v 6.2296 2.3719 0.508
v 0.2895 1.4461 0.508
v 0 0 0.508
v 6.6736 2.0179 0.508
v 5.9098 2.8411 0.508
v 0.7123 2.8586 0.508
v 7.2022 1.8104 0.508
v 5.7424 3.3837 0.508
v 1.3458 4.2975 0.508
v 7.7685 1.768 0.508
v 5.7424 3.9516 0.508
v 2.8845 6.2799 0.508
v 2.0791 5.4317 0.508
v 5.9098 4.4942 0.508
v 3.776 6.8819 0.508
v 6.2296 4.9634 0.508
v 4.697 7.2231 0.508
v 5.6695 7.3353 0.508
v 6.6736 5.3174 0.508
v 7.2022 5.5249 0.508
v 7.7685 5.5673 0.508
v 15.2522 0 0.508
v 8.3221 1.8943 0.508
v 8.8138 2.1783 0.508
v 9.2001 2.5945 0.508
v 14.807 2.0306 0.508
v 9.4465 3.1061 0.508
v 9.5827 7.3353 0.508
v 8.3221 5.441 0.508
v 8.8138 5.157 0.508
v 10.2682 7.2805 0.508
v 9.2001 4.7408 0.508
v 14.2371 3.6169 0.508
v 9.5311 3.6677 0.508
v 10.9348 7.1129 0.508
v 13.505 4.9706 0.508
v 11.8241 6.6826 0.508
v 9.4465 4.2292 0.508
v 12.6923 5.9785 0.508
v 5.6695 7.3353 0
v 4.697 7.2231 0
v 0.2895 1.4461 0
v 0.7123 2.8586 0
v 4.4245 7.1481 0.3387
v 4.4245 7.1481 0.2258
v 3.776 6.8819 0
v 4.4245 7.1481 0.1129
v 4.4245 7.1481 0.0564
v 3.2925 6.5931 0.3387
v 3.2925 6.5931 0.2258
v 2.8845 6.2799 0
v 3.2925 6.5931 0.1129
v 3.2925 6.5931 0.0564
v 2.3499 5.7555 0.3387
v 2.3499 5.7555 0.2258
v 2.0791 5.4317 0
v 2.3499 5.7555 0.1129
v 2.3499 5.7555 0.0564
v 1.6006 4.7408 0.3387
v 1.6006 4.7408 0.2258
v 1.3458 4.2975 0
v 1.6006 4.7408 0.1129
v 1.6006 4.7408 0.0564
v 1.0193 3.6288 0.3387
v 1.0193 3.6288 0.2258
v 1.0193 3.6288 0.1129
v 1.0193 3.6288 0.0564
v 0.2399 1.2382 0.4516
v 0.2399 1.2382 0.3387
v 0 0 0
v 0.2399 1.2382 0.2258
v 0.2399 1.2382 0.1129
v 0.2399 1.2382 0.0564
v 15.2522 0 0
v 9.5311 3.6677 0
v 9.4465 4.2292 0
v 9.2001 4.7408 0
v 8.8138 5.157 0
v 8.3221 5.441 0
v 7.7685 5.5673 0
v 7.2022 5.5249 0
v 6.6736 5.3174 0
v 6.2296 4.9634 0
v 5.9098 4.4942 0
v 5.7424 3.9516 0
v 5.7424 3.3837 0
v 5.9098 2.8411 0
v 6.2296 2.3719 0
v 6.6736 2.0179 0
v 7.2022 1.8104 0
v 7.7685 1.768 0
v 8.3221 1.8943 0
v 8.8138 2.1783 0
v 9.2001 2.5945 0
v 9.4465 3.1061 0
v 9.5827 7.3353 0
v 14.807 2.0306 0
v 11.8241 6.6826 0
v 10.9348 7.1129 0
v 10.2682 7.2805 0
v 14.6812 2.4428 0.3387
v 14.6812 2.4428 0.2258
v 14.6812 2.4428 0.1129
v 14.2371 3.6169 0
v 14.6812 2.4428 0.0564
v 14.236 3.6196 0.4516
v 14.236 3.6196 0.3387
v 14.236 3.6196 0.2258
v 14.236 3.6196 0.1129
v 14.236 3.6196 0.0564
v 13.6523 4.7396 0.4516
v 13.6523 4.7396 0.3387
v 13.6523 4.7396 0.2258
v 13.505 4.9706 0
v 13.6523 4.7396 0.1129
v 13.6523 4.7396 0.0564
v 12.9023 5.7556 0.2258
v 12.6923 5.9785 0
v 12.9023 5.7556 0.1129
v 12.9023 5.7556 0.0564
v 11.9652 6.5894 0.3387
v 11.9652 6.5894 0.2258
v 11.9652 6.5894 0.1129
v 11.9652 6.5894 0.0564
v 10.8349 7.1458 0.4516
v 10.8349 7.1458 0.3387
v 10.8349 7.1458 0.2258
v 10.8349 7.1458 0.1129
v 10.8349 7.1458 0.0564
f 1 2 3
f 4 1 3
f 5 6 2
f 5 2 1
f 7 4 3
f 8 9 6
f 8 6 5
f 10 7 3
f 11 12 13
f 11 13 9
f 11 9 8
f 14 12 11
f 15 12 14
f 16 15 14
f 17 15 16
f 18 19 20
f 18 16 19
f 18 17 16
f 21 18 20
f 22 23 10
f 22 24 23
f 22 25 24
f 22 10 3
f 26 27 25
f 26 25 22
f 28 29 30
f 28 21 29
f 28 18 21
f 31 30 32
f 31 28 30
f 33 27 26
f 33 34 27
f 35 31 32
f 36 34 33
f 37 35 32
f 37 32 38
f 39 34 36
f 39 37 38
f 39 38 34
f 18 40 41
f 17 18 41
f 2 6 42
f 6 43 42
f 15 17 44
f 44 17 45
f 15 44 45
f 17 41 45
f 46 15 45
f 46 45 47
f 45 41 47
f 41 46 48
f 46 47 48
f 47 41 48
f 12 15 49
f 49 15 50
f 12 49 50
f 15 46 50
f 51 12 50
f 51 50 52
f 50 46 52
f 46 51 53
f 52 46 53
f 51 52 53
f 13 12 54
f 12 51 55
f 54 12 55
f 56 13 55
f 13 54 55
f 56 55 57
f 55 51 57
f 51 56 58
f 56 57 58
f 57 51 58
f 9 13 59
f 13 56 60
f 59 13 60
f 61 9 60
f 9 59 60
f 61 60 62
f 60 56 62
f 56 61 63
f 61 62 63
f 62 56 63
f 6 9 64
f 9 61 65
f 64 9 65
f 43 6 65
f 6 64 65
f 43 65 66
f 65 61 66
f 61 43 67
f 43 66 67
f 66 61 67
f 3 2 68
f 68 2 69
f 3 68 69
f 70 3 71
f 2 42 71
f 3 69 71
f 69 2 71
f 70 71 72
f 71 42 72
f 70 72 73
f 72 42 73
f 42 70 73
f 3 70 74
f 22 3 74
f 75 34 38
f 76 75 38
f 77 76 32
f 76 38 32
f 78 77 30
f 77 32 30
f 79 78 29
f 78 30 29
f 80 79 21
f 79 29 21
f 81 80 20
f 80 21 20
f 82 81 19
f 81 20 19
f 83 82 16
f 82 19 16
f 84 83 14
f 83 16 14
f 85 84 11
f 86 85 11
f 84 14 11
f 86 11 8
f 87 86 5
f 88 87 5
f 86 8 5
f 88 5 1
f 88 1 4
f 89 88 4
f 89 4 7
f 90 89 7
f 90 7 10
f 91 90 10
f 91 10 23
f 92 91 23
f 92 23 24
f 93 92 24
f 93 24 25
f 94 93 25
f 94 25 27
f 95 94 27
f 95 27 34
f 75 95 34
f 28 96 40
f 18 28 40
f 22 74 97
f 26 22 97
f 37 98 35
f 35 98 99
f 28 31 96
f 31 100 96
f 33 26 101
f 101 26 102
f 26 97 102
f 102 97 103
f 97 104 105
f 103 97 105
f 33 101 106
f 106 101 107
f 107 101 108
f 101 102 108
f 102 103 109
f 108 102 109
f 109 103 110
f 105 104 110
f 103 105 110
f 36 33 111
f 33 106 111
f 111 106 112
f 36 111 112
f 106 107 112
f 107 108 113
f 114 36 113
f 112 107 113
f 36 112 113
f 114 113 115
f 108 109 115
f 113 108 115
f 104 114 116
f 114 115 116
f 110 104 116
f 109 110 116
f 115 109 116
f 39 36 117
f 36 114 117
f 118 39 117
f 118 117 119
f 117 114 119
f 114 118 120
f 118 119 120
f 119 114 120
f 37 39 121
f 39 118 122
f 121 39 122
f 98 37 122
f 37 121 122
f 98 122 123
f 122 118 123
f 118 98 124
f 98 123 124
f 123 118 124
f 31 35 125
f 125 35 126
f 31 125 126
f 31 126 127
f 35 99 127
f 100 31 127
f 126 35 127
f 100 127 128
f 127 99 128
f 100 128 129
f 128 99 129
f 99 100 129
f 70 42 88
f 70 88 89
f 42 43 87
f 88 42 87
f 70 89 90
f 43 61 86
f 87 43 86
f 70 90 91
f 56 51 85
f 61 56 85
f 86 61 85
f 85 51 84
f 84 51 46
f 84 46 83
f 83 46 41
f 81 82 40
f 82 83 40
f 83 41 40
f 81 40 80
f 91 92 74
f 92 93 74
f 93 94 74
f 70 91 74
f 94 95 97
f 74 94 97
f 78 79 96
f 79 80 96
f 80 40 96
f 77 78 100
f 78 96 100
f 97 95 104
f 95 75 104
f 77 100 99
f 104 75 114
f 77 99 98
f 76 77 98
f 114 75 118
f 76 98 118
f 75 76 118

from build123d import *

# Parameters (mm, degrees)
BOSS_EXTRUDE1_DEPTH = 0.508
SKETCH3_R           = 1.905
CUT_EXTRUDE1_DEPTH  = 1.5080001


with BuildPart() as part:
    # Sketch1 → Boss-Extrude1 (new body)
    with BuildSketch(Plane.XY):
        with BuildLine():
            Line((0, 0), (15.252199682, 0))
            add(Edge.make_bspline(
                [(15.252199682, 0), (15.120704697, 0.830694341), (14.937497846, 1.646944845), (14.553106346, 2.840713056), (14.406511336, 3.233478401), (14.065397829, 4.0056234), (13.872436019, 4.381220548), (13.432237437, 5.09798559), (13.181982939, 5.443027105), (12.622569242, 6.068152419), (12.313627231, 6.349687516), (11.791041042, 6.709189105), (11.607426909, 6.817668629), (11.230562195, 7.003786767), (11.035975482, 7.082401547), (10.633831708, 7.209189667), (10.425174386, 7.257312019), (10.006679556, 7.320082622), (9.795580815, 7.335304029), (9.582738696, 7.335304029)],
                knots=[0, 0, 0, 0, 0.25, 0.25, 0.375, 0.375, 0.5, 0.5, 0.625, 0.625, 0.75, 0.75, 0.8125, 0.8125, 0.875, 0.875, 0.9375, 0.9375, 1, 1, 1, 1], degree=3))
            Line((9.582738696, 7.335304029), (5.669460986, 7.335304029))
            add(Edge.make_bspline(
                [(5.669460986, 7.335304029), (5.243996086, 7.335304029), (4.828702614, 7.274669933), (4.222365546, 7.084743854), (4.024617237, 7.005080674), (3.647485659, 6.819183421), (3.466491387, 6.712483598), (3.118434336, 6.473781927), (2.950963248, 6.341174992), (2.637156438, 6.060474457), (2.489557897, 5.911629159), (2.070541236, 5.44338386), (1.820997709, 5.099528272), (1.159883637, 4.023480986), (0.833207908, 3.254615604), (0.445697358, 2.055038054), (0.334748926, 1.647706186), (0.144996604, 0.828712342), (0.06582017, 0.415806296), (0, 0)],
                knots=[0, 0, 0, 0, 0.125, 0.125, 0.1875, 0.1875, 0.25, 0.25, 0.3125, 0.3125, 0.375, 0.375, 0.5, 0.5, 0.75, 0.75, 0.875, 0.875, 1, 1, 1, 1], degree=3))
        make_face()
    extrude(amount=BOSS_EXTRUDE1_DEPTH)

    # Sketch3 → Cut-Extrude1 (cut, through all)
    with BuildSketch(Plane.XY.offset(0.508)):
        with Locations((7.626099841, 3.667652015)):
            Circle(SKETCH3_R)
    extrude(amount=-CUT_EXTRUDE1_DEPTH, mode=Mode.SUBTRACT)


solid = part.part
